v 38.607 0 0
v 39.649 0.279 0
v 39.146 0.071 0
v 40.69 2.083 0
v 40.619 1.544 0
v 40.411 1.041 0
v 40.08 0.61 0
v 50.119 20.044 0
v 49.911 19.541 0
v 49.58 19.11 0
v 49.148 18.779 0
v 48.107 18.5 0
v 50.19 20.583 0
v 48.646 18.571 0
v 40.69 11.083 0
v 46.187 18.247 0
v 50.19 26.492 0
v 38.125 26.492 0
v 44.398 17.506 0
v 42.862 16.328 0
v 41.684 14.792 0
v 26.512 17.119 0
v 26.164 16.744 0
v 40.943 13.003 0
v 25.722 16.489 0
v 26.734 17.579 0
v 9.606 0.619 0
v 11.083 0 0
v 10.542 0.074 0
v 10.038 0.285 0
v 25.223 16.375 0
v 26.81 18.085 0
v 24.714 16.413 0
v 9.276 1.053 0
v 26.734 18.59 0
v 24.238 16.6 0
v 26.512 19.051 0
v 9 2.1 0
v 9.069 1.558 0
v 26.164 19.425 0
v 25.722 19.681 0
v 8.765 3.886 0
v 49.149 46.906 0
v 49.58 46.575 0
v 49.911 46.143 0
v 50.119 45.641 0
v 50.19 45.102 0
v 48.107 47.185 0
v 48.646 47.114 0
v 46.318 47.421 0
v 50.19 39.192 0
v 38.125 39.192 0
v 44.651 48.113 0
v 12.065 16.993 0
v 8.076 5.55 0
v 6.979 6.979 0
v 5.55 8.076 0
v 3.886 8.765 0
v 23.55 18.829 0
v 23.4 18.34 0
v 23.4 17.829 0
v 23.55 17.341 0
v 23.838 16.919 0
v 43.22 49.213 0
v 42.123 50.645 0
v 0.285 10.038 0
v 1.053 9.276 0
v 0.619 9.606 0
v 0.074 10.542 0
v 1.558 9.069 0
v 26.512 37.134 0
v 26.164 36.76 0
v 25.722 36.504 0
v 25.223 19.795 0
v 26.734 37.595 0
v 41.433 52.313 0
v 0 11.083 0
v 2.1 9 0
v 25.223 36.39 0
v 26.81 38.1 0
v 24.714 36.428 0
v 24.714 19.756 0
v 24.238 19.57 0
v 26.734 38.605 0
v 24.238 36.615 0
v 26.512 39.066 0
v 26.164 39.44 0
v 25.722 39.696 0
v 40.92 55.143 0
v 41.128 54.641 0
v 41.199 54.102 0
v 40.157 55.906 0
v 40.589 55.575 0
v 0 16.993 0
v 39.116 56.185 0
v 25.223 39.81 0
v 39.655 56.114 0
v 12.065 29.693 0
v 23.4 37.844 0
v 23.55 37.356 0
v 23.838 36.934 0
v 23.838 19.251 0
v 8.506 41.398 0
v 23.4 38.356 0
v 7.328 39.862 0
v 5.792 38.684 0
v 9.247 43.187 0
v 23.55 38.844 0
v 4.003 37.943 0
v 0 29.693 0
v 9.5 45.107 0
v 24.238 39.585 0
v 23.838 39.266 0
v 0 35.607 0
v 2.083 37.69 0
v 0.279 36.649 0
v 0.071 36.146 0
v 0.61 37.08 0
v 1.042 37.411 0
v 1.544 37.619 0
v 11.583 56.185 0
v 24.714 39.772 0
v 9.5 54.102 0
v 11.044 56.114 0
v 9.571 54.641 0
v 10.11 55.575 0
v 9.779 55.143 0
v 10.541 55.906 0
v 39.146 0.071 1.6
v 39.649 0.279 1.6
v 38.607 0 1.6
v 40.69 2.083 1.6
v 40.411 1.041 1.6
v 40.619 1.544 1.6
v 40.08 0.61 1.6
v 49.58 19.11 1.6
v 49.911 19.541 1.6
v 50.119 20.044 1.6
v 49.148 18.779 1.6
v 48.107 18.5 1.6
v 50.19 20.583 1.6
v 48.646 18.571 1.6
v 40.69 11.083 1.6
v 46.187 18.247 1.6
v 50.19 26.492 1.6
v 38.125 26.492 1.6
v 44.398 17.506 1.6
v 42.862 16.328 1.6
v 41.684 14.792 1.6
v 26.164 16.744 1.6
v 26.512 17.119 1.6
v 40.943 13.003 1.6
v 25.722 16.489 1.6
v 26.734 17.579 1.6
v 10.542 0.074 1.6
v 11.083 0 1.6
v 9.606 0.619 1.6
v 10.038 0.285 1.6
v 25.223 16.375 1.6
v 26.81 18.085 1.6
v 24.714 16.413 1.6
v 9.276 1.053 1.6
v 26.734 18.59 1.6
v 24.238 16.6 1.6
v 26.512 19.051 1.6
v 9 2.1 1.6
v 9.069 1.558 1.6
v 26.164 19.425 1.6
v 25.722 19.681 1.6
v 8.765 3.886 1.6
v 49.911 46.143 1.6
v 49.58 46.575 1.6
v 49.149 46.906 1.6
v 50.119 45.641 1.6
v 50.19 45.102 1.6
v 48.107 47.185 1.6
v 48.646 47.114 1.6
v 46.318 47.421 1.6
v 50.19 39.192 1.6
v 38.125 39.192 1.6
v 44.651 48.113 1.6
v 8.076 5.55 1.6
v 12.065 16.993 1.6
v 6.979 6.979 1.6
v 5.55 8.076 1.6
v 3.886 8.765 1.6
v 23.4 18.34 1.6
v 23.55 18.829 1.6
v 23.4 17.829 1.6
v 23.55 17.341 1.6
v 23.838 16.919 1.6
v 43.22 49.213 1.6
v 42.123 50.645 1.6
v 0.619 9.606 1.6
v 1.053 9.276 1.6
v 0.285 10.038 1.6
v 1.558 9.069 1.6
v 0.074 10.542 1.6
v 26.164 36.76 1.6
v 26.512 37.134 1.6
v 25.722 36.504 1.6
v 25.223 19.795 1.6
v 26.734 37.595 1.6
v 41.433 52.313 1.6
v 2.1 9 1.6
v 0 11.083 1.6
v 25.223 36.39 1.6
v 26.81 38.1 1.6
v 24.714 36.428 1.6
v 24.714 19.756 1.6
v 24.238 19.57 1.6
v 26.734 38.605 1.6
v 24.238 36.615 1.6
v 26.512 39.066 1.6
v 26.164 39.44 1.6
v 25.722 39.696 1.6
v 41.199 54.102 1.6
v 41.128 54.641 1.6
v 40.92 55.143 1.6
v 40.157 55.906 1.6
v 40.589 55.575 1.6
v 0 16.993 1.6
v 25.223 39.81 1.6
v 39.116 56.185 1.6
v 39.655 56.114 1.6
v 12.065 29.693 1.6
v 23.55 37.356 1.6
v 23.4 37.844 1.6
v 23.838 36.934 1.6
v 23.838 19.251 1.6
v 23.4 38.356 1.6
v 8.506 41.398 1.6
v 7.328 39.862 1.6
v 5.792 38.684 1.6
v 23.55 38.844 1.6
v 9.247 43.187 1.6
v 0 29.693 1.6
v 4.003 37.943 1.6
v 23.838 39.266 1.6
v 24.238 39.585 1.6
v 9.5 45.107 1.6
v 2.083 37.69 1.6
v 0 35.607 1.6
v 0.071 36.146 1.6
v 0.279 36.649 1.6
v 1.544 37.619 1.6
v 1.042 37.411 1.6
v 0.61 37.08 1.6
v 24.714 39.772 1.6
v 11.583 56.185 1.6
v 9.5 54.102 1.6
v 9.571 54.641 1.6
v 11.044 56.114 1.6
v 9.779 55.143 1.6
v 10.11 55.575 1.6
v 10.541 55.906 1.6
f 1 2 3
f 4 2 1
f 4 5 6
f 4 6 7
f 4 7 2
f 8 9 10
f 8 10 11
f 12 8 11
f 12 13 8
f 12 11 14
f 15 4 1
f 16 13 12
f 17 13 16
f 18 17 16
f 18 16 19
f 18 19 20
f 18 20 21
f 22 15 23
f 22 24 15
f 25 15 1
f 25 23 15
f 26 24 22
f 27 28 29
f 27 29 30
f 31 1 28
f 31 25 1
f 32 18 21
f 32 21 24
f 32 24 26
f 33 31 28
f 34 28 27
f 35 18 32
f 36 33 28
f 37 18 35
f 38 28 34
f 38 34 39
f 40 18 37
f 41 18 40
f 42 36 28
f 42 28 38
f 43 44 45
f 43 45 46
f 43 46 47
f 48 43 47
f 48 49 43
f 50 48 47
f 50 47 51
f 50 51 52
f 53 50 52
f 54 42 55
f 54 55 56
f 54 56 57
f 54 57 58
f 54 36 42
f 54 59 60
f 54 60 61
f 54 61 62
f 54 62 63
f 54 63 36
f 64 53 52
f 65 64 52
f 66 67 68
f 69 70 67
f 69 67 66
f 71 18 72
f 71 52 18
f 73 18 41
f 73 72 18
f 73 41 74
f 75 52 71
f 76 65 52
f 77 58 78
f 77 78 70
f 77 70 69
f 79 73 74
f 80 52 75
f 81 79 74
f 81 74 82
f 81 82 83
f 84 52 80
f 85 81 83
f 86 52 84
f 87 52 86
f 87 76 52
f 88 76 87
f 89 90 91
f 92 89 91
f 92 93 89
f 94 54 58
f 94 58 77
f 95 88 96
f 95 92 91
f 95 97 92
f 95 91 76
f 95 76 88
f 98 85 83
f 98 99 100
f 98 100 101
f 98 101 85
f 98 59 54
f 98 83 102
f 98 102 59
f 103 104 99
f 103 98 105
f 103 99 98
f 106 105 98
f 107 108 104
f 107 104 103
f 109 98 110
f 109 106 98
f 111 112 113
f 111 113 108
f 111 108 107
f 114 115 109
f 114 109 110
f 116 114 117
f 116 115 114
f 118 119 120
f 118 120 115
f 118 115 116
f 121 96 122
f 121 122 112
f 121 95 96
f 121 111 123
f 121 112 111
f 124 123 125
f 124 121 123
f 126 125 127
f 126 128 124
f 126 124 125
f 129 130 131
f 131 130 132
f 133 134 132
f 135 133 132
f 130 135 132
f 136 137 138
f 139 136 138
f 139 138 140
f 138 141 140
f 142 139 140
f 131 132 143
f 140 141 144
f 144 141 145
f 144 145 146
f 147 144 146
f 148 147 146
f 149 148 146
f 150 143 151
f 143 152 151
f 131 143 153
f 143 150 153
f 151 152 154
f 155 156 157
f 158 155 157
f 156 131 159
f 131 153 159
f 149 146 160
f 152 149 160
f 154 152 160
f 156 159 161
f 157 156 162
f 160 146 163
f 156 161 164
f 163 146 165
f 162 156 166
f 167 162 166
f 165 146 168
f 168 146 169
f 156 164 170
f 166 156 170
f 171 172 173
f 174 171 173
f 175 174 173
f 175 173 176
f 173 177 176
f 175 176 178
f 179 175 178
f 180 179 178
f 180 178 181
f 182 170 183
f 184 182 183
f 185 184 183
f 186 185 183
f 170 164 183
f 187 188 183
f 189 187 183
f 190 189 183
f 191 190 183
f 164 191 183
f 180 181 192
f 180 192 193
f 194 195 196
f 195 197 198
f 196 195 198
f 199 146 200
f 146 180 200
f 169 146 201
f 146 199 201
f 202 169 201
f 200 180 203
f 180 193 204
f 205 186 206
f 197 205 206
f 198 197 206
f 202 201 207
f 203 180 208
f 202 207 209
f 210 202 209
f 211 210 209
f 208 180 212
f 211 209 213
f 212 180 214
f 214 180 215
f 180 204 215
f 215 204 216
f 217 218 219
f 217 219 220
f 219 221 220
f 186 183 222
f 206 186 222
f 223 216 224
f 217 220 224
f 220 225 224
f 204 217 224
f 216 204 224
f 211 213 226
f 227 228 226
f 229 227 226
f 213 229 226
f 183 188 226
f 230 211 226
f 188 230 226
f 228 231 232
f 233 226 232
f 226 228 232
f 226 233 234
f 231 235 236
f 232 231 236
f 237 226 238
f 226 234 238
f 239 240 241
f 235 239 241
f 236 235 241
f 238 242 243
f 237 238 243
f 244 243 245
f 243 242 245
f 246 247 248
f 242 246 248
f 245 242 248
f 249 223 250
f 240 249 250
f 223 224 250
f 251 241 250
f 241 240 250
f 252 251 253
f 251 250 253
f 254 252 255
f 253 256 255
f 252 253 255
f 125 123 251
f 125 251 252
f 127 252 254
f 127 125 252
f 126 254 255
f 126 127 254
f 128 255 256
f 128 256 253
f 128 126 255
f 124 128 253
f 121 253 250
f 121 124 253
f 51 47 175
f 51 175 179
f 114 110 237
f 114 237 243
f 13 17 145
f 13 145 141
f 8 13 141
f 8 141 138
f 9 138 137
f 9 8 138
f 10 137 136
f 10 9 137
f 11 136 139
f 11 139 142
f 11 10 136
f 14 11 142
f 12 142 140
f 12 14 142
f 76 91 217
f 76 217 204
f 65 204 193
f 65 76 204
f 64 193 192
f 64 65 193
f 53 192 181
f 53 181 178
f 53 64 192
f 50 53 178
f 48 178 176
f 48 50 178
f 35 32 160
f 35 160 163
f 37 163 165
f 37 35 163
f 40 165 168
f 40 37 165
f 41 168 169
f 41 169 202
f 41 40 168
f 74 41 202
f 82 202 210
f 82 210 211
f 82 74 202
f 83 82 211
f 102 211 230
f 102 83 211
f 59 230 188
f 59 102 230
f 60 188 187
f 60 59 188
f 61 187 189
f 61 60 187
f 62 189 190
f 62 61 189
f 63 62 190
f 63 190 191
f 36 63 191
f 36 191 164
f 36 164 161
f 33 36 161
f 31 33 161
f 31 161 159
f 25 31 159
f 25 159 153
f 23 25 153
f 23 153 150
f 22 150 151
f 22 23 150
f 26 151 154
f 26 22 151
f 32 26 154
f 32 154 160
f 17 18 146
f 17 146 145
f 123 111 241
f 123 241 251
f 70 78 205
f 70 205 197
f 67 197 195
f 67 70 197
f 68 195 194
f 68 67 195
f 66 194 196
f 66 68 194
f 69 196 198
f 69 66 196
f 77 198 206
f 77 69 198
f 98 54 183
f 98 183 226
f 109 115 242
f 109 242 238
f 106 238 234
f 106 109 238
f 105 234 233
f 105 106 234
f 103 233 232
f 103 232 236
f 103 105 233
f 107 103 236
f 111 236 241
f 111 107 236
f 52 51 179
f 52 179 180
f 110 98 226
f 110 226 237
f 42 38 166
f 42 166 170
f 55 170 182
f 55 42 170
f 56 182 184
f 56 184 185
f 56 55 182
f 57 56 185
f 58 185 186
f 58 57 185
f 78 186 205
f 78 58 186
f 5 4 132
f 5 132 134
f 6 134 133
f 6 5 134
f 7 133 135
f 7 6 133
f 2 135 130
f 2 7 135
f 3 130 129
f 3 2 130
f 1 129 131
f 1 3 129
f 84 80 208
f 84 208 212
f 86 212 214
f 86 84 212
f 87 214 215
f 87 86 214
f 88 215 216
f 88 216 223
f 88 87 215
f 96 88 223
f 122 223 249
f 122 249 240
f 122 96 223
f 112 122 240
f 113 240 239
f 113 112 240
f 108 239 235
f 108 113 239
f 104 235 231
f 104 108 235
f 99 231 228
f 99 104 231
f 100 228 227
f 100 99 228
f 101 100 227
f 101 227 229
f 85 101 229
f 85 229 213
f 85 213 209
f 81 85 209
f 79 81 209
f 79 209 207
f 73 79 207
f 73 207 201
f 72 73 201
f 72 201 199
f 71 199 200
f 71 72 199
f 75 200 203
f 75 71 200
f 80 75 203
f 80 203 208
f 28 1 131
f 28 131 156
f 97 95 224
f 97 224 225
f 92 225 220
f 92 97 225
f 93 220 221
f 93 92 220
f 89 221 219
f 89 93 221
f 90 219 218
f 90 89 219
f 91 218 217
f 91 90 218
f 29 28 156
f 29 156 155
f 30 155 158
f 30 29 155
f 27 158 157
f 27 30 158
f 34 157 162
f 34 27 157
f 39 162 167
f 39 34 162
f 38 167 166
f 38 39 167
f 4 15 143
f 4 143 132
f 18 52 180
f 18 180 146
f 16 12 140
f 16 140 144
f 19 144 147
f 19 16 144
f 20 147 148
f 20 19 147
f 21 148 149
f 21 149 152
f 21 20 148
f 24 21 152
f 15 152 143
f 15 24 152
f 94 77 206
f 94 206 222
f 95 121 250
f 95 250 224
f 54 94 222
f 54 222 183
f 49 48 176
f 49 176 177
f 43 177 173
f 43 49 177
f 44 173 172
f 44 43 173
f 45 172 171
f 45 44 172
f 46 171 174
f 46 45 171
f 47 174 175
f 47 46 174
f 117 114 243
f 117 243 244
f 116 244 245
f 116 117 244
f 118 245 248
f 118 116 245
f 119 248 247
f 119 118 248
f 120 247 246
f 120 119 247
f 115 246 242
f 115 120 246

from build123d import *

# Parameters (mm, degrees)
SKETCH2_R           = 1.7145
BOSS_EXTRUDE1_DEPTH = 1.6002


with BuildPart() as part:
    # Sketch2 → Boss-Extrude1 (new body)
    with BuildSketch(Plane.XY):
        with BuildLine():
            Line((38.6072, 0), (11.082800196, 1.7681e-05))
            ThreePointArc((11.082800196, 1.7681e-05), (9.606488401, 0.61865036), (9.000017681, 2.099999804))
            ThreePointArc((9.000017681, 2.099999804), (6.97904829, 6.979042972), (2.099999804, 9.000017681))
            ThreePointArc((2.099999804, 9.000017681), (0.61865036, 9.606488401), (1.7681e-05, 11.082800196))
            Line((1.7681e-05, 11.082800196), (0, 16.9926))
            Line((0, 16.9926), (12.065, 16.9926))
            Line((12.065, 16.9926), (12.065, 29.6926))
            Line((12.065, 29.6926), (0, 29.6926))
            Line((0, 29.6926), (1e-08, 35.607199954))
            ThreePointArc((1e-08, 35.607199954), (0.61023797, 37.080044807), (2.083199954, 37.68999999))
            ThreePointArc((2.083199954, 37.68999999), (7.327669562, 39.862330403), (9.5, 45.1068))
            Line((9.5, 45.1068), (9.5, 54.102))
            ThreePointArc((9.5, 54.102), (10.110037996, 55.574762004), (11.5828, 56.1848))
            Line((11.5828, 56.1848), (39.116, 56.1848))
            ThreePointArc((39.116, 56.1848), (40.588762004, 55.574762004), (41.1988, 54.102))
            ThreePointArc((41.1988, 54.102), (43.220399728, 49.21262534), (48.107196234, 47.184801403))
            ThreePointArc((48.107196234, 47.184801403), (49.579961168, 46.574764242), (50.19, 45.102))
            Line((50.19, 45.102), (50.19, 39.1922))
            Line((50.19, 39.1922), (38.125, 39.1922))
            Line((38.125, 39.1922), (38.125, 26.4922))
            Line((38.125, 26.4922), (50.19, 26.4922))
            Line((50.19, 26.4922), (50.18999999, 20.582800046))
            ThreePointArc((50.18999999, 20.582800046), (49.57976203, 19.109955193), (48.106800046, 18.50000001))
            ThreePointArc((48.106800046, 18.50000001), (42.862330438, 16.327669597), (40.69, 11.0832))
            Line((40.69, 11.0832), (40.69, 2.0828))
            ThreePointArc((40.69, 2.0828), (40.079962004, 0.610037996), (38.6072, 0))
        make_face()
        with Locations((25.0952, 38.1)):
            Circle(SKETCH2_R, mode=Mode.SUBTRACT)
        with Locations((25.0952, 18.0848)):
            Circle(SKETCH2_R, mode=Mode.SUBTRACT)
    extrude(amount=BOSS_EXTRUDE1_DEPTH)


solid = part.part
